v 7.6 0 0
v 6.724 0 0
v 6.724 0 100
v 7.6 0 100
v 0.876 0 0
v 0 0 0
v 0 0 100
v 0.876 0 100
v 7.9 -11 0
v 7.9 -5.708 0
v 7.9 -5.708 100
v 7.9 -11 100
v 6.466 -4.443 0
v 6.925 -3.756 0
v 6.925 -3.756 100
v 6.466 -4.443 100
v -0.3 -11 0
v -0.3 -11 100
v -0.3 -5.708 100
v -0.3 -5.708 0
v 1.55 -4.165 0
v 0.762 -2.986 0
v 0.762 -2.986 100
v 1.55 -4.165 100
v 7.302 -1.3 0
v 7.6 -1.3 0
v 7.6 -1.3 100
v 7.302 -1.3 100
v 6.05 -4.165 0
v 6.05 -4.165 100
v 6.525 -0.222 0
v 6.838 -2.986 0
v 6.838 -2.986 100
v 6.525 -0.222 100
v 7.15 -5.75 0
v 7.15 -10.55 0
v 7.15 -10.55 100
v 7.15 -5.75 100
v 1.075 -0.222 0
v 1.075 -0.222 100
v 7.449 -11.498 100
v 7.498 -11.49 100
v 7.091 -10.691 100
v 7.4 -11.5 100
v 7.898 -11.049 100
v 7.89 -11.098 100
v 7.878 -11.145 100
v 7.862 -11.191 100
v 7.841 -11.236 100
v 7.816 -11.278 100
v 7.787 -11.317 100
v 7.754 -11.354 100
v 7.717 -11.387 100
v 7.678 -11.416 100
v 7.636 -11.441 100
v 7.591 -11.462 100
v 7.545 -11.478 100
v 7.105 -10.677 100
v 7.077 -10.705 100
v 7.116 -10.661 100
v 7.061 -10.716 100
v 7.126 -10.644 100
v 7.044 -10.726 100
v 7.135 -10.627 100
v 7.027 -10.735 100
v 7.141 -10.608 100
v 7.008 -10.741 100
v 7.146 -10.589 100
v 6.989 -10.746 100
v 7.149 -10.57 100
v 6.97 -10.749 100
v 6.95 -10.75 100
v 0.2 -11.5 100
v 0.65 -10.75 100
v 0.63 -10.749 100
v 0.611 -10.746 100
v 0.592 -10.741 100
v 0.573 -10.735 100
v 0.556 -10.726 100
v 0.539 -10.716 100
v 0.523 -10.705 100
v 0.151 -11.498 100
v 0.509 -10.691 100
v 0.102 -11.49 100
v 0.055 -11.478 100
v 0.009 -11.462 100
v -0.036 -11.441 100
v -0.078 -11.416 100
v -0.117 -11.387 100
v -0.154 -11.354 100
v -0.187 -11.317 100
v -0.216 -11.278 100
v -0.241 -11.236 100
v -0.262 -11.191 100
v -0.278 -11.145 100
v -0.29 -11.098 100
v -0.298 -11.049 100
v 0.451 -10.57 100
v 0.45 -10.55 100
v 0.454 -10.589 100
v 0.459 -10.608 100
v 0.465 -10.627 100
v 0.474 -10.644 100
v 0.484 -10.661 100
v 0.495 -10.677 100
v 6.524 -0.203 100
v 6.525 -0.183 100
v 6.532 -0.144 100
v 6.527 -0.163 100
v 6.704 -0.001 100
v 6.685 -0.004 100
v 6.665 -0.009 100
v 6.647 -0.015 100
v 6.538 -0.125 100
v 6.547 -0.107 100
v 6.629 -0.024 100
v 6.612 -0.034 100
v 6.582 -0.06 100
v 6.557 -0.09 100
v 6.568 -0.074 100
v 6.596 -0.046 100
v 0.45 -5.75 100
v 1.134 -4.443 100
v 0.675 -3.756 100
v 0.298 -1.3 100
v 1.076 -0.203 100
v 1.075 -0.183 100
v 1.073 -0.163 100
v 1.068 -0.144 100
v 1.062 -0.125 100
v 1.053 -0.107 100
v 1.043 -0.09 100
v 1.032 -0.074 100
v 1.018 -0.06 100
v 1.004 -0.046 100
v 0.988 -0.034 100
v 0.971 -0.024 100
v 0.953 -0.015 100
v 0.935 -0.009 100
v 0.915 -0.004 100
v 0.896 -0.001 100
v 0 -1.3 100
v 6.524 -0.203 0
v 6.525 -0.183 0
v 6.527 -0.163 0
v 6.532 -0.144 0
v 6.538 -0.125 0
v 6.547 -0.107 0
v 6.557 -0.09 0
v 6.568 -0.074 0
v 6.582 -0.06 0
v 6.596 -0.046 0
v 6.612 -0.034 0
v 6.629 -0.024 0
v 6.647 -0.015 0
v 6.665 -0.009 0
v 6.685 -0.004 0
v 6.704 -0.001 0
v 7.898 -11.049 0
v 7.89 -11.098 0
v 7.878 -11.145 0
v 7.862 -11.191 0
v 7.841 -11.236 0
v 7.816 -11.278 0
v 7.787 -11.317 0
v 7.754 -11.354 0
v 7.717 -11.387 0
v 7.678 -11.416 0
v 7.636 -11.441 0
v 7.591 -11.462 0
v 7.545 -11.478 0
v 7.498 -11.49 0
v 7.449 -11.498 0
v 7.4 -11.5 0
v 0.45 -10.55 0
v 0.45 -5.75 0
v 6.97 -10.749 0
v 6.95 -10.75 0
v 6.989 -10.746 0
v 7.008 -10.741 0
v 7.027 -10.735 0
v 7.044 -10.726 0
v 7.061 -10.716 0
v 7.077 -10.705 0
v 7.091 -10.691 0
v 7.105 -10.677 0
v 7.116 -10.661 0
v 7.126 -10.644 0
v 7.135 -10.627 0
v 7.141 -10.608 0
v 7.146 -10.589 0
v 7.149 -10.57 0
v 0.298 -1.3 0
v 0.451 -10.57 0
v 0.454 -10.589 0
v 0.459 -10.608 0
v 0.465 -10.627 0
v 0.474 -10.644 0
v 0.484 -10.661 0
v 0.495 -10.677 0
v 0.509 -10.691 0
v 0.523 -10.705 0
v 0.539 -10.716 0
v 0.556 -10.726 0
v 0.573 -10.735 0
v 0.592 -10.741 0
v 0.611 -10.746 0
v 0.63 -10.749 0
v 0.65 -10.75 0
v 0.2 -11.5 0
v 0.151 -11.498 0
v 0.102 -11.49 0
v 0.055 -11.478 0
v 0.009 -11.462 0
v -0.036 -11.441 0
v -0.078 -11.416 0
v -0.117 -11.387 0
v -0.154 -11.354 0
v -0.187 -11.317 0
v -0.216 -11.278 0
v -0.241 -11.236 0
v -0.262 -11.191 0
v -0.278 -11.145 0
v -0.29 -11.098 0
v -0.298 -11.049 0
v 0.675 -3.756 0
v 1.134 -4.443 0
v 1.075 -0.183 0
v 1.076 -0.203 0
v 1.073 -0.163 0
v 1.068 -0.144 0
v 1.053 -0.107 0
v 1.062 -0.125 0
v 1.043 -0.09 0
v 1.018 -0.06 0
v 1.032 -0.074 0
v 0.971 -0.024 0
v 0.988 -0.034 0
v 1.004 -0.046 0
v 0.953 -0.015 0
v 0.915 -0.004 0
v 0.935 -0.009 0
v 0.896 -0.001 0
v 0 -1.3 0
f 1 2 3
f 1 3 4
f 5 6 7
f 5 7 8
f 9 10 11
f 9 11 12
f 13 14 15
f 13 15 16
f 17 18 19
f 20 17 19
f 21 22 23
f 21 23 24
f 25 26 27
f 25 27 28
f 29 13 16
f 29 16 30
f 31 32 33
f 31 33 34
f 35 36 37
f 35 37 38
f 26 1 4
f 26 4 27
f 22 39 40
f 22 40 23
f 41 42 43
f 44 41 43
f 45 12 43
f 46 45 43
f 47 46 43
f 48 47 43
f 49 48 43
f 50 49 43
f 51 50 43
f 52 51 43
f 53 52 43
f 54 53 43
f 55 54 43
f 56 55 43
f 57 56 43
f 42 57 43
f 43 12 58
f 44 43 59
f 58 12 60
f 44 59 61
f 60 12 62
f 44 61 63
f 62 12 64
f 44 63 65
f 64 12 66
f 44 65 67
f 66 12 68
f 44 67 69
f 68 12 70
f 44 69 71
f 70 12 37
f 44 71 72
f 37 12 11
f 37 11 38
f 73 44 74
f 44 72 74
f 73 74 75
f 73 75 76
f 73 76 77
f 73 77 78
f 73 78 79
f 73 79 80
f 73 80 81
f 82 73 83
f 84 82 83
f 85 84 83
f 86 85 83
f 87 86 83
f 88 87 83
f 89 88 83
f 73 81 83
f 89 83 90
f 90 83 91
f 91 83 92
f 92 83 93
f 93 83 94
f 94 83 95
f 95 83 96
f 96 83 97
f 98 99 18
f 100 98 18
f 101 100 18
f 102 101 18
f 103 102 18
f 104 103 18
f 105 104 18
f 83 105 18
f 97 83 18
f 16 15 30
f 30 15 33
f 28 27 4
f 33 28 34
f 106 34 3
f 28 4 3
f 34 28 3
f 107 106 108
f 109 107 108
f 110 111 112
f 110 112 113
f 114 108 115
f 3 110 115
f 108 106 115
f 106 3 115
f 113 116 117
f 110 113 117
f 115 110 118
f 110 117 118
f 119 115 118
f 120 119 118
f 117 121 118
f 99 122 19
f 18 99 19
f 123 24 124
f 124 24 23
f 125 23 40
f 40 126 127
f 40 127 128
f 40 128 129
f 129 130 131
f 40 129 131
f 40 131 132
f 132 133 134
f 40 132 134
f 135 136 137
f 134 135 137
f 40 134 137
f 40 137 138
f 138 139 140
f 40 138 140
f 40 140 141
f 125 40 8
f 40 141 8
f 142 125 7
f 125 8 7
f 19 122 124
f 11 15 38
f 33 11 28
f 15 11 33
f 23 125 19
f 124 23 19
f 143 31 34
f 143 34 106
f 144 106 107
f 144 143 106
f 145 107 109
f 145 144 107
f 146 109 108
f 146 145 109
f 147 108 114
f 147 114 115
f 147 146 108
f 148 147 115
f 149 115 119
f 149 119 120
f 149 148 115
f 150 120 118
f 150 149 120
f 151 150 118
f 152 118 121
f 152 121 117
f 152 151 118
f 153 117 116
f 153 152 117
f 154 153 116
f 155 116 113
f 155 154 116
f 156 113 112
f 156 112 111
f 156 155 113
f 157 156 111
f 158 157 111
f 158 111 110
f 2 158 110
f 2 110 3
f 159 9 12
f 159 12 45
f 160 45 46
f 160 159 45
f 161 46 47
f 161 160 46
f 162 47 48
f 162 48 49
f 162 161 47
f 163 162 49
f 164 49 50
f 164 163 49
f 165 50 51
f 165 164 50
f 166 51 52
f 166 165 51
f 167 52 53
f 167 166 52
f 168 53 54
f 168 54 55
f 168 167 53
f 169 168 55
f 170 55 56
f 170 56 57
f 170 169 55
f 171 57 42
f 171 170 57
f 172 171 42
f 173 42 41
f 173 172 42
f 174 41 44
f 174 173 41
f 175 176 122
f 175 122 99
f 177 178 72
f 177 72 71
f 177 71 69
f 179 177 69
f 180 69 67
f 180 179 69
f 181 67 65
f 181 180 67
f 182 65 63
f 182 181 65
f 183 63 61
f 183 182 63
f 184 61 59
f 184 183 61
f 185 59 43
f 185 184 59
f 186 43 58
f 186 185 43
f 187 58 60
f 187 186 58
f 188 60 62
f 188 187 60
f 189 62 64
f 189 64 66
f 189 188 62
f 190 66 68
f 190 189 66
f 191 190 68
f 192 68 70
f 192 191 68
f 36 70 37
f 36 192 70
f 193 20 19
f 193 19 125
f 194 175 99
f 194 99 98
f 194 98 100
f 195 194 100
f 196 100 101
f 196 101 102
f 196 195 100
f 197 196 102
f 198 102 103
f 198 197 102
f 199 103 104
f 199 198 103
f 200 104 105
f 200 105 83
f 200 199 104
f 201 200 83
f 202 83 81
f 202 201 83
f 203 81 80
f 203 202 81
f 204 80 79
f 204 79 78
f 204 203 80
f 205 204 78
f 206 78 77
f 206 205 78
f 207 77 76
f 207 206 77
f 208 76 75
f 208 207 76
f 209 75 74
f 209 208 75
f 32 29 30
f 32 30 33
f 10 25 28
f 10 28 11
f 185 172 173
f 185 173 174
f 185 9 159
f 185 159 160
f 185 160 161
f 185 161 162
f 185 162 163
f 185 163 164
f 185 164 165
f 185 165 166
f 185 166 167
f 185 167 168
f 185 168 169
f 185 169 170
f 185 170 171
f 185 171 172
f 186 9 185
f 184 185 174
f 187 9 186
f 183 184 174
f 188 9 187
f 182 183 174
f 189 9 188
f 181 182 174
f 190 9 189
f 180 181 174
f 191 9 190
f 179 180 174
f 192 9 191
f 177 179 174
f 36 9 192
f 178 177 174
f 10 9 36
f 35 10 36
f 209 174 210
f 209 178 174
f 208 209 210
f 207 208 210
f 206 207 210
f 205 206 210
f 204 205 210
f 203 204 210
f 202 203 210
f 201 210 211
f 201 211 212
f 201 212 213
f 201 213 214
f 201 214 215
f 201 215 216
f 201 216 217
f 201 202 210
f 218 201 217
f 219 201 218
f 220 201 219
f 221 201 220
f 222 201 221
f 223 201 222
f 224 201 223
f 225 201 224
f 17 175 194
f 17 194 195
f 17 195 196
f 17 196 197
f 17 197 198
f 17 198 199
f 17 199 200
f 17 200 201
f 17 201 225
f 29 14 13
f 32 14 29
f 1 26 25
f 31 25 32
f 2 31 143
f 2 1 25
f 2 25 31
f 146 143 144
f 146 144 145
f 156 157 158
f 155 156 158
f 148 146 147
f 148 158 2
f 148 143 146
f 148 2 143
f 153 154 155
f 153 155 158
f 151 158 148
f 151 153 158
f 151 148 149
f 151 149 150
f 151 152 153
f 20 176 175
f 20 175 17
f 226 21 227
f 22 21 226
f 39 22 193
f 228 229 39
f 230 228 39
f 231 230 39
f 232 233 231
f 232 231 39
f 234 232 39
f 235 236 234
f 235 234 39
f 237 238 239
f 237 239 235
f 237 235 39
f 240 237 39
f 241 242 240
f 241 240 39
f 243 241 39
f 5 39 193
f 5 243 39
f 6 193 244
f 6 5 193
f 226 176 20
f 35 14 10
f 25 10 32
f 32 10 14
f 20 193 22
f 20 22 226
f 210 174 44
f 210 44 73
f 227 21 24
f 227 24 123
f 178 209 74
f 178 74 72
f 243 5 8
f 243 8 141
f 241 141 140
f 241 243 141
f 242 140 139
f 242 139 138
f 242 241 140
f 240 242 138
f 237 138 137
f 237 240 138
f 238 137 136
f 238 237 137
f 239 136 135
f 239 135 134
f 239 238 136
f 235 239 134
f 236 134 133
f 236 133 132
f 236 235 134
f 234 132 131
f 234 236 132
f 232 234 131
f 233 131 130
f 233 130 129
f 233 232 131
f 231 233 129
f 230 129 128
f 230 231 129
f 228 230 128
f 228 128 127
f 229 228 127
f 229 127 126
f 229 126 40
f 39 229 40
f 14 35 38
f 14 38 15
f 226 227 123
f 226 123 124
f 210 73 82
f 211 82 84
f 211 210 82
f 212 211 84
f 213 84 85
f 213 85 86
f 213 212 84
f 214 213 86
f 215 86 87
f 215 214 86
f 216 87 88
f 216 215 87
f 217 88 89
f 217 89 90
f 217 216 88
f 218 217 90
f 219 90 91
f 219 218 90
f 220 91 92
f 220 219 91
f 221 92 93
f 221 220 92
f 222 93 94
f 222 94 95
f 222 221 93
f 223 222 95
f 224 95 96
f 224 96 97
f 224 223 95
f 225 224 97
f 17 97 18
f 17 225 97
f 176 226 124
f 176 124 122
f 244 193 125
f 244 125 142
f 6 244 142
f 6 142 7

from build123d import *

# Parameters (mm, degrees)
EXTRUDE_1_DEPTH = 100


with BuildPart() as part:
    # 草图1 → 凸台-拉伸1 (new body)
    with BuildSketch(Plane.XY):
        with BuildLine():
            Line((0, -1.3), (0, 0))
            Line((0, 0), (0.876117478, 0))
            ThreePointArc((0.876117478, 0), (1.025270289, -0.066757968), (1.074851714, -0.222465609))
            Line((1.074851714, -0.222465609), (0.762425857, -2.986232805))
            Line((0.762425857, -2.986232805), (1.55, -4.165282478))
            Line((1.55, -4.165282478), (1.134225832, -4.443008676))
            Line((1.134225832, -4.443008676), (0.675396165, -3.756110847))
            Line((0.675396165, -3.756110847), (0.45, -5.75))
            Line((0.45, -5.75), (0.45, -10.55))
            ThreePointArc((0.45, -10.55), (0.508578644, -10.691421356), (0.65, -10.75))
            Line((0.65, -10.75), (6.95, -10.75))
            ThreePointArc((6.95, -10.75), (7.091421356, -10.691421356), (7.15, -10.55))
            Line((7.15, -10.55), (7.15, -5.75))
            Line((7.15, -5.75), (6.924603835, -3.756110847))
            Line((6.924603835, -3.756110847), (6.465774168, -4.443008676))
            Line((6.465774168, -4.443008676), (6.05, -4.165282478))
            Line((6.05, -4.165282478), (6.837574143, -2.986232805))
            Line((6.837574143, -2.986232805), (6.525148286, -0.222465609))
            ThreePointArc((6.525148286, -0.222465609), (6.574729711, -0.066757968), (6.723882522, 0))
            Line((6.723882522, 0), (7.6, 0))
            Line((7.6, 0), (7.6, -1.3))
            Line((7.6, -1.3), (7.30173337, -1.3))
            Line((7.30173337, -1.3), (7.9, -5.707743265))
            Line((7.9, -5.707743265), (7.9, -11))
            ThreePointArc((7.9, -11), (7.753553391, -11.353553391), (7.4, -11.5))
            Line((7.4, -11.5), (0.2, -11.5))
            ThreePointArc((0.2, -11.5), (-0.153553391, -11.353553391), (-0.3, -11))
            Line((-0.3, -11), (-0.3, -5.707743265))
            Line((-0.3, -5.707743265), (0.29826663, -1.3))
            Line((0.29826663, -1.3), (0, -1.3))
        make_face()
    extrude(amount=EXTRUDE_1_DEPTH)


solid = part.part
